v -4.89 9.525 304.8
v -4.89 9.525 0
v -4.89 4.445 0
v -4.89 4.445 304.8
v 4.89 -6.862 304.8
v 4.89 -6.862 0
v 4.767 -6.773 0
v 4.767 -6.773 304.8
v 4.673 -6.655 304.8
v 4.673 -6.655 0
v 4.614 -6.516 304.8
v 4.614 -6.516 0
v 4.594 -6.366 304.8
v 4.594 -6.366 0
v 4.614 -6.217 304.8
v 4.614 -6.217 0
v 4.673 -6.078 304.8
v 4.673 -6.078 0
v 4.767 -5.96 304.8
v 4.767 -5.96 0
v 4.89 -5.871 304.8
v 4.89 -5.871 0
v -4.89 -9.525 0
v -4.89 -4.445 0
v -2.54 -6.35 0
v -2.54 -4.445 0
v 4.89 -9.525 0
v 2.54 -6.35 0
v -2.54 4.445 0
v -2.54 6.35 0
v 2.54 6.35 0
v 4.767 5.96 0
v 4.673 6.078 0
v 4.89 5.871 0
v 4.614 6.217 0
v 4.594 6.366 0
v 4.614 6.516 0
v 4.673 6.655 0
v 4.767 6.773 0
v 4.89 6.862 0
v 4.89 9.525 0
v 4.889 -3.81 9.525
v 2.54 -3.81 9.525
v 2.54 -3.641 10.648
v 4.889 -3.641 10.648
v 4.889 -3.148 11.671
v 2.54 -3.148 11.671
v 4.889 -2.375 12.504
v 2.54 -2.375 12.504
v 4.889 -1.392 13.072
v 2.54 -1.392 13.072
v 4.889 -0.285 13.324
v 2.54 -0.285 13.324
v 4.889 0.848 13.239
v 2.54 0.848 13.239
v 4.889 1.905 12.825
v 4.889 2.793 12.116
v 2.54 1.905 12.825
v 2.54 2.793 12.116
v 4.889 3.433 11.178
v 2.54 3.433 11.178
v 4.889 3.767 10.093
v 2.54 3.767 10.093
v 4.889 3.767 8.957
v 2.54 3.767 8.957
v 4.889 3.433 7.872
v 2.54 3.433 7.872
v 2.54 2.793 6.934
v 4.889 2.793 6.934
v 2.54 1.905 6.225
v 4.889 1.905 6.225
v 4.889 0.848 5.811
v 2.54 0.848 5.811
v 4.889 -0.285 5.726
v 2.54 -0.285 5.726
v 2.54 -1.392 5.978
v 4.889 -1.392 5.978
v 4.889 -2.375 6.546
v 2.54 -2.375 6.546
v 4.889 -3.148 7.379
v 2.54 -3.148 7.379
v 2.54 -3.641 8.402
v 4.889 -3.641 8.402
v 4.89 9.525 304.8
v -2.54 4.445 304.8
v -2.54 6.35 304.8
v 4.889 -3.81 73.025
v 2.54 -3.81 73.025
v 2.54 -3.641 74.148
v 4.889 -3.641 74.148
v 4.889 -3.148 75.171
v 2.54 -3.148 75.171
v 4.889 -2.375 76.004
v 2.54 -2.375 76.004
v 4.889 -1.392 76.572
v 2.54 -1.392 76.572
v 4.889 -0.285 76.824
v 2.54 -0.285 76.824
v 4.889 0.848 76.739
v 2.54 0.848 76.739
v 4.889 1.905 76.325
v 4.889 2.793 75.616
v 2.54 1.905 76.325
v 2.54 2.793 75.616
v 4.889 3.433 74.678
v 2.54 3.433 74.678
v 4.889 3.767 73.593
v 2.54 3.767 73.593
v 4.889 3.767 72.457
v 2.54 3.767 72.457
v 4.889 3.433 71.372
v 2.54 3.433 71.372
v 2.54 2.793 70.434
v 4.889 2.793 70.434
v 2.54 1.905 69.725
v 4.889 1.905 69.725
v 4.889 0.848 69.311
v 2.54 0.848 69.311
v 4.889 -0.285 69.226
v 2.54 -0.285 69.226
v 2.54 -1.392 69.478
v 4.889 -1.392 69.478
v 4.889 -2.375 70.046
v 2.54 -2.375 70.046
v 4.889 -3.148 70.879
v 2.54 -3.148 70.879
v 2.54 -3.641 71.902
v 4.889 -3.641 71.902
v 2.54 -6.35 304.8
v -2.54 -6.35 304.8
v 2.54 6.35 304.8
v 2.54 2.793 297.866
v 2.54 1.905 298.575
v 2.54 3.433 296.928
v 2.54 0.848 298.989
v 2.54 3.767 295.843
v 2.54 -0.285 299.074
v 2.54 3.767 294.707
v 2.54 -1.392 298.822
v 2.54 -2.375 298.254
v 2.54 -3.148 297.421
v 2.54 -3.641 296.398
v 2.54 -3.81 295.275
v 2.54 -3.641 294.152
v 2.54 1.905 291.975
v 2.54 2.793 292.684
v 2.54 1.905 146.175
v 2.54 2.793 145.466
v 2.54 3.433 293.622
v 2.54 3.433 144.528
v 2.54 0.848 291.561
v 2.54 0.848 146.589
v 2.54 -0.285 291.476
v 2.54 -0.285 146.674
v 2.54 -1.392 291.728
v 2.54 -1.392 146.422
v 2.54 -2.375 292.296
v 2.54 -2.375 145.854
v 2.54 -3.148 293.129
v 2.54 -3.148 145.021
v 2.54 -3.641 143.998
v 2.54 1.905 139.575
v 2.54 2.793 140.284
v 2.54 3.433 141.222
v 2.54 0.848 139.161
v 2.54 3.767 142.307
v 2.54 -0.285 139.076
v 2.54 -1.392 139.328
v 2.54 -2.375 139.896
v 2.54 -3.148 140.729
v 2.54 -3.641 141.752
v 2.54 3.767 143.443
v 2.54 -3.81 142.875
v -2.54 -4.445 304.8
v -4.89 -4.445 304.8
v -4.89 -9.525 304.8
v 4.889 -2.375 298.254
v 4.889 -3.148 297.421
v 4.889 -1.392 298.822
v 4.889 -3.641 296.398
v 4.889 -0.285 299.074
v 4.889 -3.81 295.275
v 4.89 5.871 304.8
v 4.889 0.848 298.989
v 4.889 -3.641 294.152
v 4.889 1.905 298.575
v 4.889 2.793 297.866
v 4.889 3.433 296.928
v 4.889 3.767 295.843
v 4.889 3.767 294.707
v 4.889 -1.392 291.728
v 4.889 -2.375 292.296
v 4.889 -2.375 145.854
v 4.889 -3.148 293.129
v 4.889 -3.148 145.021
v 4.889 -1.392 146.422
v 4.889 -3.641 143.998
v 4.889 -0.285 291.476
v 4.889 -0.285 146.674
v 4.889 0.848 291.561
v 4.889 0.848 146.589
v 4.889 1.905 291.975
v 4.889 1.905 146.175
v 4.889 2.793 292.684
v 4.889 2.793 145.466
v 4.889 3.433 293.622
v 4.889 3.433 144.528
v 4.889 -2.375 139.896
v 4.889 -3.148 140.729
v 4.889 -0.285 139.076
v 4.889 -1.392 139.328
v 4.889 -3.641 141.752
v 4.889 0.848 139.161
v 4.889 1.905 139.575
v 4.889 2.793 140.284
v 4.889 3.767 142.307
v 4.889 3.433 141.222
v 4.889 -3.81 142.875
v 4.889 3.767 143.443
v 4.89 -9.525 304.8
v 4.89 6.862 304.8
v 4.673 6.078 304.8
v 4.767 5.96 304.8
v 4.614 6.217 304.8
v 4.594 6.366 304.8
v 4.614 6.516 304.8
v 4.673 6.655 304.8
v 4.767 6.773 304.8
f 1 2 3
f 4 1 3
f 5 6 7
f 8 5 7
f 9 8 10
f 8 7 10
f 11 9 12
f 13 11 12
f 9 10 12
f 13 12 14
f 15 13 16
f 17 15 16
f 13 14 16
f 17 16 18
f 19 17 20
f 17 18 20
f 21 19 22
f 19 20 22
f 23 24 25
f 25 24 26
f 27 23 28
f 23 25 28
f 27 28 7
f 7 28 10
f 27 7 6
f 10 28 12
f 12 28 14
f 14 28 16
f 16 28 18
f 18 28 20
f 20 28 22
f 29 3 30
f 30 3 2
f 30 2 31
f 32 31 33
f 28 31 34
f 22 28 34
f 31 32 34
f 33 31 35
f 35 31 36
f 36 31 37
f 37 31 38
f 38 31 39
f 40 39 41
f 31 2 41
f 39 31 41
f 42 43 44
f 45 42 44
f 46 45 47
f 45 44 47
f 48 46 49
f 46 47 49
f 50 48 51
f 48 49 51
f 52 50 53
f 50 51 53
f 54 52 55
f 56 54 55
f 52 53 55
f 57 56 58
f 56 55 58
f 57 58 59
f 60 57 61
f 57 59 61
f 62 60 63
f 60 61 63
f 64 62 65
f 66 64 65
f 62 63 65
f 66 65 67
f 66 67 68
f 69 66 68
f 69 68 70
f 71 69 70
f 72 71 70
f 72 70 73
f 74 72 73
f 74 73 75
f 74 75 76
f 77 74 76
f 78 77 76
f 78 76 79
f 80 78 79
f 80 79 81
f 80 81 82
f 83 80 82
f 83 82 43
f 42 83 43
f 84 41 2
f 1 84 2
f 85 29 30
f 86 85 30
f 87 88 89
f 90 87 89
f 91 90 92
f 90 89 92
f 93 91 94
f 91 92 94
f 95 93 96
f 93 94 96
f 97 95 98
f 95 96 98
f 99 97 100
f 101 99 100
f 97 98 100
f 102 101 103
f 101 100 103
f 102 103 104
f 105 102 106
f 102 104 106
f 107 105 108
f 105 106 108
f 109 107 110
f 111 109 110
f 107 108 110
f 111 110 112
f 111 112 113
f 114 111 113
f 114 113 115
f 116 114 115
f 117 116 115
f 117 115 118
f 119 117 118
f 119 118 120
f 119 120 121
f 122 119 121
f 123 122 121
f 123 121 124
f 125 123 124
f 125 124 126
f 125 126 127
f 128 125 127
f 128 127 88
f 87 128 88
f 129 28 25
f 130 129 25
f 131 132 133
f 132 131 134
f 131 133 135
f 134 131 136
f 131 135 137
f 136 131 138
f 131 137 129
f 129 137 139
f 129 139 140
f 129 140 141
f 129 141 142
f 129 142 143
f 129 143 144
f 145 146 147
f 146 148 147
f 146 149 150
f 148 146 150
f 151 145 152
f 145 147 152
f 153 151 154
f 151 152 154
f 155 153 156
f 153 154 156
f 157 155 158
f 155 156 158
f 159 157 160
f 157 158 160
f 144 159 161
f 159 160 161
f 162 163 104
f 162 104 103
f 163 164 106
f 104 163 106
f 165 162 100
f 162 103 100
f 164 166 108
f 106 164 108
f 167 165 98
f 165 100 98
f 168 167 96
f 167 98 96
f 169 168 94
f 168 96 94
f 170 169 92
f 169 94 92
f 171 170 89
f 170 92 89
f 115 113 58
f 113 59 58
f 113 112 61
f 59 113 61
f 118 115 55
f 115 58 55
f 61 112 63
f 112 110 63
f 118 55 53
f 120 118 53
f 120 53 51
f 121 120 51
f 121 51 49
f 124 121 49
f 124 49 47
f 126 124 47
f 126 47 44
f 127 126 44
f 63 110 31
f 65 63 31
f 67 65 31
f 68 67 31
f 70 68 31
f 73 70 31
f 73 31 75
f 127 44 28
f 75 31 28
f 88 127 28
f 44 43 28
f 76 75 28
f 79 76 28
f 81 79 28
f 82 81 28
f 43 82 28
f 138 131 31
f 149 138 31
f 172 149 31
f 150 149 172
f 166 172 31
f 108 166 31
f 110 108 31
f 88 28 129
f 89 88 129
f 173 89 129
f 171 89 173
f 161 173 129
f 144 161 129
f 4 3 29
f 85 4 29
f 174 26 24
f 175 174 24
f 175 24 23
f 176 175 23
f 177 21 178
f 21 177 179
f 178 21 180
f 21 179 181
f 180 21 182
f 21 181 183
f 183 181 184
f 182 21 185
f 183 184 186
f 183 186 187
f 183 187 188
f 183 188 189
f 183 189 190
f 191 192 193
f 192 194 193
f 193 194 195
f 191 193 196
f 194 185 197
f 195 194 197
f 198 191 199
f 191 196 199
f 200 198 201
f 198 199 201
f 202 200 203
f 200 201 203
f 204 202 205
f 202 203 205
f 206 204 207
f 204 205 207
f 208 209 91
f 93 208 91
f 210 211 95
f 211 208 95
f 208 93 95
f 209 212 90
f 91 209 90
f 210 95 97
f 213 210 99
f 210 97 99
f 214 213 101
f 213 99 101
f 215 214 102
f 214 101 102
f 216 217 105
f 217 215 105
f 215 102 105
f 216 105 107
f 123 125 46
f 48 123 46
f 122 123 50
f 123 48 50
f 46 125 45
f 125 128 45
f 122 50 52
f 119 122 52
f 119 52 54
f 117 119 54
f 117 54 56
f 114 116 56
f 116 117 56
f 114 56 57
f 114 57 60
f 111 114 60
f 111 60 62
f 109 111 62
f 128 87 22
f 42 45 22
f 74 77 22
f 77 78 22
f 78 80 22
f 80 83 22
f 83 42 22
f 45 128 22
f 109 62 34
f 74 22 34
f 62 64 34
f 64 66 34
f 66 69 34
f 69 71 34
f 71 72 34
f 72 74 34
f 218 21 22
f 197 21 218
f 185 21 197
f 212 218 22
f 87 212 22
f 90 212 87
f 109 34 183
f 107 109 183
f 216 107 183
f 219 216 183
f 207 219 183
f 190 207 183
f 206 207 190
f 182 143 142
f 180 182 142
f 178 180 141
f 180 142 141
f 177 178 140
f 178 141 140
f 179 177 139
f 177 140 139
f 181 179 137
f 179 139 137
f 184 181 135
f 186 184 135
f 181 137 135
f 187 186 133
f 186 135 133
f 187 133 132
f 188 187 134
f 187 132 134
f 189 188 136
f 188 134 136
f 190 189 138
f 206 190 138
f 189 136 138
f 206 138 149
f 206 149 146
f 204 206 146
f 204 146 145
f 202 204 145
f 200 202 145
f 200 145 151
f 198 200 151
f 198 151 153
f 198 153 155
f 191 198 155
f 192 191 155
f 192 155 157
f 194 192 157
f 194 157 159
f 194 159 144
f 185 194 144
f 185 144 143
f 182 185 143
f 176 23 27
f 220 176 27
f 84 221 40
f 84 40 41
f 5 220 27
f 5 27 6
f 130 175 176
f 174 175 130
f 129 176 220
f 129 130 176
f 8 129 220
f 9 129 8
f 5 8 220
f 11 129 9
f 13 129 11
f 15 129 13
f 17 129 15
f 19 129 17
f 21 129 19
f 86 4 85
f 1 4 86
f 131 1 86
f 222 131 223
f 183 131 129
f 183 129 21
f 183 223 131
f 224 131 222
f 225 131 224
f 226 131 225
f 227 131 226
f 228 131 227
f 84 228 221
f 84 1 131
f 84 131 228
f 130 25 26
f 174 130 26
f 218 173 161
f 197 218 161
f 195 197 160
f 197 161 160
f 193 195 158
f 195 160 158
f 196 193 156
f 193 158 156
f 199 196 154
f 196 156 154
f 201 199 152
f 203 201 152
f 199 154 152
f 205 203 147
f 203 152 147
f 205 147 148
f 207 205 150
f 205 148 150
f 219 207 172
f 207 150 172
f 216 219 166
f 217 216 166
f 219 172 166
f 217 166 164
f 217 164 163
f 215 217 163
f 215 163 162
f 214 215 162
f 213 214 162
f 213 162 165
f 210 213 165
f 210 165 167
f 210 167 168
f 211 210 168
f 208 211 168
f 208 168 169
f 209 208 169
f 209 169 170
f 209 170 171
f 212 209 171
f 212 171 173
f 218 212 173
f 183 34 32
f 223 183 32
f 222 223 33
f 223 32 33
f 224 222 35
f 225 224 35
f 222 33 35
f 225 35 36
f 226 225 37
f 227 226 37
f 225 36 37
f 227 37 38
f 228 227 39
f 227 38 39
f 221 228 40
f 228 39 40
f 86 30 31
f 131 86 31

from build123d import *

# Parameters (mm, degrees)
F1_DEPTH = 304.8
F3_D     = 7.62
F3_DEPTH = 25.4


with BuildPart() as f1:
    # F0 (on Top) → F1 (new body)
    with BuildSketch(Plane.XY):
        with BuildLine():
            Line((-4.8895, -9.525), (4.8895, -9.525))
            Line((4.8895, -9.525), (4.8895, -6.861627))
            ThreePointArc((4.8895, -6.861627), (4.593677, -6.366351), (4.8895, -5.871076))
            Line((4.8895, -5.871076), (4.8895, 5.871076))
            ThreePointArc((4.8895, 5.871076), (4.593677, 6.366351), (4.8895, 6.861627))
            Line((4.8895, 6.861627), (4.8895, 9.525))
            Line((4.8895, 9.525), (-4.8895, 9.525))
            Line((-4.8895, 9.525), (-4.8895, 4.445))
            Line((-4.8895, 4.445), (-2.54, 4.445))
            Line((-2.54, 4.445), (-2.54, 6.35))
            Line((-2.54, 6.35), (2.54, 6.35))
            Line((2.54, 6.35), (2.54, -6.35))
            Line((2.54, -6.35), (-2.54, -6.35))
            Line((-2.54, -6.35), (-2.54, -4.445))
            Line((-2.54, -4.445), (-4.8895, -4.445))
            Line((-4.8895, -4.445), (-4.8895, -9.525))
        make_face()
    extrude(amount=F1_DEPTH)

    # F3
    with Locations(Plane.YZ.offset(4.8895)):
        with Locations((0, 295.275), (0, 142.875), (0, 73.025), (0, 9.525)):
            Hole(F3_D / 2, depth=F3_DEPTH)


solid = f1.part
